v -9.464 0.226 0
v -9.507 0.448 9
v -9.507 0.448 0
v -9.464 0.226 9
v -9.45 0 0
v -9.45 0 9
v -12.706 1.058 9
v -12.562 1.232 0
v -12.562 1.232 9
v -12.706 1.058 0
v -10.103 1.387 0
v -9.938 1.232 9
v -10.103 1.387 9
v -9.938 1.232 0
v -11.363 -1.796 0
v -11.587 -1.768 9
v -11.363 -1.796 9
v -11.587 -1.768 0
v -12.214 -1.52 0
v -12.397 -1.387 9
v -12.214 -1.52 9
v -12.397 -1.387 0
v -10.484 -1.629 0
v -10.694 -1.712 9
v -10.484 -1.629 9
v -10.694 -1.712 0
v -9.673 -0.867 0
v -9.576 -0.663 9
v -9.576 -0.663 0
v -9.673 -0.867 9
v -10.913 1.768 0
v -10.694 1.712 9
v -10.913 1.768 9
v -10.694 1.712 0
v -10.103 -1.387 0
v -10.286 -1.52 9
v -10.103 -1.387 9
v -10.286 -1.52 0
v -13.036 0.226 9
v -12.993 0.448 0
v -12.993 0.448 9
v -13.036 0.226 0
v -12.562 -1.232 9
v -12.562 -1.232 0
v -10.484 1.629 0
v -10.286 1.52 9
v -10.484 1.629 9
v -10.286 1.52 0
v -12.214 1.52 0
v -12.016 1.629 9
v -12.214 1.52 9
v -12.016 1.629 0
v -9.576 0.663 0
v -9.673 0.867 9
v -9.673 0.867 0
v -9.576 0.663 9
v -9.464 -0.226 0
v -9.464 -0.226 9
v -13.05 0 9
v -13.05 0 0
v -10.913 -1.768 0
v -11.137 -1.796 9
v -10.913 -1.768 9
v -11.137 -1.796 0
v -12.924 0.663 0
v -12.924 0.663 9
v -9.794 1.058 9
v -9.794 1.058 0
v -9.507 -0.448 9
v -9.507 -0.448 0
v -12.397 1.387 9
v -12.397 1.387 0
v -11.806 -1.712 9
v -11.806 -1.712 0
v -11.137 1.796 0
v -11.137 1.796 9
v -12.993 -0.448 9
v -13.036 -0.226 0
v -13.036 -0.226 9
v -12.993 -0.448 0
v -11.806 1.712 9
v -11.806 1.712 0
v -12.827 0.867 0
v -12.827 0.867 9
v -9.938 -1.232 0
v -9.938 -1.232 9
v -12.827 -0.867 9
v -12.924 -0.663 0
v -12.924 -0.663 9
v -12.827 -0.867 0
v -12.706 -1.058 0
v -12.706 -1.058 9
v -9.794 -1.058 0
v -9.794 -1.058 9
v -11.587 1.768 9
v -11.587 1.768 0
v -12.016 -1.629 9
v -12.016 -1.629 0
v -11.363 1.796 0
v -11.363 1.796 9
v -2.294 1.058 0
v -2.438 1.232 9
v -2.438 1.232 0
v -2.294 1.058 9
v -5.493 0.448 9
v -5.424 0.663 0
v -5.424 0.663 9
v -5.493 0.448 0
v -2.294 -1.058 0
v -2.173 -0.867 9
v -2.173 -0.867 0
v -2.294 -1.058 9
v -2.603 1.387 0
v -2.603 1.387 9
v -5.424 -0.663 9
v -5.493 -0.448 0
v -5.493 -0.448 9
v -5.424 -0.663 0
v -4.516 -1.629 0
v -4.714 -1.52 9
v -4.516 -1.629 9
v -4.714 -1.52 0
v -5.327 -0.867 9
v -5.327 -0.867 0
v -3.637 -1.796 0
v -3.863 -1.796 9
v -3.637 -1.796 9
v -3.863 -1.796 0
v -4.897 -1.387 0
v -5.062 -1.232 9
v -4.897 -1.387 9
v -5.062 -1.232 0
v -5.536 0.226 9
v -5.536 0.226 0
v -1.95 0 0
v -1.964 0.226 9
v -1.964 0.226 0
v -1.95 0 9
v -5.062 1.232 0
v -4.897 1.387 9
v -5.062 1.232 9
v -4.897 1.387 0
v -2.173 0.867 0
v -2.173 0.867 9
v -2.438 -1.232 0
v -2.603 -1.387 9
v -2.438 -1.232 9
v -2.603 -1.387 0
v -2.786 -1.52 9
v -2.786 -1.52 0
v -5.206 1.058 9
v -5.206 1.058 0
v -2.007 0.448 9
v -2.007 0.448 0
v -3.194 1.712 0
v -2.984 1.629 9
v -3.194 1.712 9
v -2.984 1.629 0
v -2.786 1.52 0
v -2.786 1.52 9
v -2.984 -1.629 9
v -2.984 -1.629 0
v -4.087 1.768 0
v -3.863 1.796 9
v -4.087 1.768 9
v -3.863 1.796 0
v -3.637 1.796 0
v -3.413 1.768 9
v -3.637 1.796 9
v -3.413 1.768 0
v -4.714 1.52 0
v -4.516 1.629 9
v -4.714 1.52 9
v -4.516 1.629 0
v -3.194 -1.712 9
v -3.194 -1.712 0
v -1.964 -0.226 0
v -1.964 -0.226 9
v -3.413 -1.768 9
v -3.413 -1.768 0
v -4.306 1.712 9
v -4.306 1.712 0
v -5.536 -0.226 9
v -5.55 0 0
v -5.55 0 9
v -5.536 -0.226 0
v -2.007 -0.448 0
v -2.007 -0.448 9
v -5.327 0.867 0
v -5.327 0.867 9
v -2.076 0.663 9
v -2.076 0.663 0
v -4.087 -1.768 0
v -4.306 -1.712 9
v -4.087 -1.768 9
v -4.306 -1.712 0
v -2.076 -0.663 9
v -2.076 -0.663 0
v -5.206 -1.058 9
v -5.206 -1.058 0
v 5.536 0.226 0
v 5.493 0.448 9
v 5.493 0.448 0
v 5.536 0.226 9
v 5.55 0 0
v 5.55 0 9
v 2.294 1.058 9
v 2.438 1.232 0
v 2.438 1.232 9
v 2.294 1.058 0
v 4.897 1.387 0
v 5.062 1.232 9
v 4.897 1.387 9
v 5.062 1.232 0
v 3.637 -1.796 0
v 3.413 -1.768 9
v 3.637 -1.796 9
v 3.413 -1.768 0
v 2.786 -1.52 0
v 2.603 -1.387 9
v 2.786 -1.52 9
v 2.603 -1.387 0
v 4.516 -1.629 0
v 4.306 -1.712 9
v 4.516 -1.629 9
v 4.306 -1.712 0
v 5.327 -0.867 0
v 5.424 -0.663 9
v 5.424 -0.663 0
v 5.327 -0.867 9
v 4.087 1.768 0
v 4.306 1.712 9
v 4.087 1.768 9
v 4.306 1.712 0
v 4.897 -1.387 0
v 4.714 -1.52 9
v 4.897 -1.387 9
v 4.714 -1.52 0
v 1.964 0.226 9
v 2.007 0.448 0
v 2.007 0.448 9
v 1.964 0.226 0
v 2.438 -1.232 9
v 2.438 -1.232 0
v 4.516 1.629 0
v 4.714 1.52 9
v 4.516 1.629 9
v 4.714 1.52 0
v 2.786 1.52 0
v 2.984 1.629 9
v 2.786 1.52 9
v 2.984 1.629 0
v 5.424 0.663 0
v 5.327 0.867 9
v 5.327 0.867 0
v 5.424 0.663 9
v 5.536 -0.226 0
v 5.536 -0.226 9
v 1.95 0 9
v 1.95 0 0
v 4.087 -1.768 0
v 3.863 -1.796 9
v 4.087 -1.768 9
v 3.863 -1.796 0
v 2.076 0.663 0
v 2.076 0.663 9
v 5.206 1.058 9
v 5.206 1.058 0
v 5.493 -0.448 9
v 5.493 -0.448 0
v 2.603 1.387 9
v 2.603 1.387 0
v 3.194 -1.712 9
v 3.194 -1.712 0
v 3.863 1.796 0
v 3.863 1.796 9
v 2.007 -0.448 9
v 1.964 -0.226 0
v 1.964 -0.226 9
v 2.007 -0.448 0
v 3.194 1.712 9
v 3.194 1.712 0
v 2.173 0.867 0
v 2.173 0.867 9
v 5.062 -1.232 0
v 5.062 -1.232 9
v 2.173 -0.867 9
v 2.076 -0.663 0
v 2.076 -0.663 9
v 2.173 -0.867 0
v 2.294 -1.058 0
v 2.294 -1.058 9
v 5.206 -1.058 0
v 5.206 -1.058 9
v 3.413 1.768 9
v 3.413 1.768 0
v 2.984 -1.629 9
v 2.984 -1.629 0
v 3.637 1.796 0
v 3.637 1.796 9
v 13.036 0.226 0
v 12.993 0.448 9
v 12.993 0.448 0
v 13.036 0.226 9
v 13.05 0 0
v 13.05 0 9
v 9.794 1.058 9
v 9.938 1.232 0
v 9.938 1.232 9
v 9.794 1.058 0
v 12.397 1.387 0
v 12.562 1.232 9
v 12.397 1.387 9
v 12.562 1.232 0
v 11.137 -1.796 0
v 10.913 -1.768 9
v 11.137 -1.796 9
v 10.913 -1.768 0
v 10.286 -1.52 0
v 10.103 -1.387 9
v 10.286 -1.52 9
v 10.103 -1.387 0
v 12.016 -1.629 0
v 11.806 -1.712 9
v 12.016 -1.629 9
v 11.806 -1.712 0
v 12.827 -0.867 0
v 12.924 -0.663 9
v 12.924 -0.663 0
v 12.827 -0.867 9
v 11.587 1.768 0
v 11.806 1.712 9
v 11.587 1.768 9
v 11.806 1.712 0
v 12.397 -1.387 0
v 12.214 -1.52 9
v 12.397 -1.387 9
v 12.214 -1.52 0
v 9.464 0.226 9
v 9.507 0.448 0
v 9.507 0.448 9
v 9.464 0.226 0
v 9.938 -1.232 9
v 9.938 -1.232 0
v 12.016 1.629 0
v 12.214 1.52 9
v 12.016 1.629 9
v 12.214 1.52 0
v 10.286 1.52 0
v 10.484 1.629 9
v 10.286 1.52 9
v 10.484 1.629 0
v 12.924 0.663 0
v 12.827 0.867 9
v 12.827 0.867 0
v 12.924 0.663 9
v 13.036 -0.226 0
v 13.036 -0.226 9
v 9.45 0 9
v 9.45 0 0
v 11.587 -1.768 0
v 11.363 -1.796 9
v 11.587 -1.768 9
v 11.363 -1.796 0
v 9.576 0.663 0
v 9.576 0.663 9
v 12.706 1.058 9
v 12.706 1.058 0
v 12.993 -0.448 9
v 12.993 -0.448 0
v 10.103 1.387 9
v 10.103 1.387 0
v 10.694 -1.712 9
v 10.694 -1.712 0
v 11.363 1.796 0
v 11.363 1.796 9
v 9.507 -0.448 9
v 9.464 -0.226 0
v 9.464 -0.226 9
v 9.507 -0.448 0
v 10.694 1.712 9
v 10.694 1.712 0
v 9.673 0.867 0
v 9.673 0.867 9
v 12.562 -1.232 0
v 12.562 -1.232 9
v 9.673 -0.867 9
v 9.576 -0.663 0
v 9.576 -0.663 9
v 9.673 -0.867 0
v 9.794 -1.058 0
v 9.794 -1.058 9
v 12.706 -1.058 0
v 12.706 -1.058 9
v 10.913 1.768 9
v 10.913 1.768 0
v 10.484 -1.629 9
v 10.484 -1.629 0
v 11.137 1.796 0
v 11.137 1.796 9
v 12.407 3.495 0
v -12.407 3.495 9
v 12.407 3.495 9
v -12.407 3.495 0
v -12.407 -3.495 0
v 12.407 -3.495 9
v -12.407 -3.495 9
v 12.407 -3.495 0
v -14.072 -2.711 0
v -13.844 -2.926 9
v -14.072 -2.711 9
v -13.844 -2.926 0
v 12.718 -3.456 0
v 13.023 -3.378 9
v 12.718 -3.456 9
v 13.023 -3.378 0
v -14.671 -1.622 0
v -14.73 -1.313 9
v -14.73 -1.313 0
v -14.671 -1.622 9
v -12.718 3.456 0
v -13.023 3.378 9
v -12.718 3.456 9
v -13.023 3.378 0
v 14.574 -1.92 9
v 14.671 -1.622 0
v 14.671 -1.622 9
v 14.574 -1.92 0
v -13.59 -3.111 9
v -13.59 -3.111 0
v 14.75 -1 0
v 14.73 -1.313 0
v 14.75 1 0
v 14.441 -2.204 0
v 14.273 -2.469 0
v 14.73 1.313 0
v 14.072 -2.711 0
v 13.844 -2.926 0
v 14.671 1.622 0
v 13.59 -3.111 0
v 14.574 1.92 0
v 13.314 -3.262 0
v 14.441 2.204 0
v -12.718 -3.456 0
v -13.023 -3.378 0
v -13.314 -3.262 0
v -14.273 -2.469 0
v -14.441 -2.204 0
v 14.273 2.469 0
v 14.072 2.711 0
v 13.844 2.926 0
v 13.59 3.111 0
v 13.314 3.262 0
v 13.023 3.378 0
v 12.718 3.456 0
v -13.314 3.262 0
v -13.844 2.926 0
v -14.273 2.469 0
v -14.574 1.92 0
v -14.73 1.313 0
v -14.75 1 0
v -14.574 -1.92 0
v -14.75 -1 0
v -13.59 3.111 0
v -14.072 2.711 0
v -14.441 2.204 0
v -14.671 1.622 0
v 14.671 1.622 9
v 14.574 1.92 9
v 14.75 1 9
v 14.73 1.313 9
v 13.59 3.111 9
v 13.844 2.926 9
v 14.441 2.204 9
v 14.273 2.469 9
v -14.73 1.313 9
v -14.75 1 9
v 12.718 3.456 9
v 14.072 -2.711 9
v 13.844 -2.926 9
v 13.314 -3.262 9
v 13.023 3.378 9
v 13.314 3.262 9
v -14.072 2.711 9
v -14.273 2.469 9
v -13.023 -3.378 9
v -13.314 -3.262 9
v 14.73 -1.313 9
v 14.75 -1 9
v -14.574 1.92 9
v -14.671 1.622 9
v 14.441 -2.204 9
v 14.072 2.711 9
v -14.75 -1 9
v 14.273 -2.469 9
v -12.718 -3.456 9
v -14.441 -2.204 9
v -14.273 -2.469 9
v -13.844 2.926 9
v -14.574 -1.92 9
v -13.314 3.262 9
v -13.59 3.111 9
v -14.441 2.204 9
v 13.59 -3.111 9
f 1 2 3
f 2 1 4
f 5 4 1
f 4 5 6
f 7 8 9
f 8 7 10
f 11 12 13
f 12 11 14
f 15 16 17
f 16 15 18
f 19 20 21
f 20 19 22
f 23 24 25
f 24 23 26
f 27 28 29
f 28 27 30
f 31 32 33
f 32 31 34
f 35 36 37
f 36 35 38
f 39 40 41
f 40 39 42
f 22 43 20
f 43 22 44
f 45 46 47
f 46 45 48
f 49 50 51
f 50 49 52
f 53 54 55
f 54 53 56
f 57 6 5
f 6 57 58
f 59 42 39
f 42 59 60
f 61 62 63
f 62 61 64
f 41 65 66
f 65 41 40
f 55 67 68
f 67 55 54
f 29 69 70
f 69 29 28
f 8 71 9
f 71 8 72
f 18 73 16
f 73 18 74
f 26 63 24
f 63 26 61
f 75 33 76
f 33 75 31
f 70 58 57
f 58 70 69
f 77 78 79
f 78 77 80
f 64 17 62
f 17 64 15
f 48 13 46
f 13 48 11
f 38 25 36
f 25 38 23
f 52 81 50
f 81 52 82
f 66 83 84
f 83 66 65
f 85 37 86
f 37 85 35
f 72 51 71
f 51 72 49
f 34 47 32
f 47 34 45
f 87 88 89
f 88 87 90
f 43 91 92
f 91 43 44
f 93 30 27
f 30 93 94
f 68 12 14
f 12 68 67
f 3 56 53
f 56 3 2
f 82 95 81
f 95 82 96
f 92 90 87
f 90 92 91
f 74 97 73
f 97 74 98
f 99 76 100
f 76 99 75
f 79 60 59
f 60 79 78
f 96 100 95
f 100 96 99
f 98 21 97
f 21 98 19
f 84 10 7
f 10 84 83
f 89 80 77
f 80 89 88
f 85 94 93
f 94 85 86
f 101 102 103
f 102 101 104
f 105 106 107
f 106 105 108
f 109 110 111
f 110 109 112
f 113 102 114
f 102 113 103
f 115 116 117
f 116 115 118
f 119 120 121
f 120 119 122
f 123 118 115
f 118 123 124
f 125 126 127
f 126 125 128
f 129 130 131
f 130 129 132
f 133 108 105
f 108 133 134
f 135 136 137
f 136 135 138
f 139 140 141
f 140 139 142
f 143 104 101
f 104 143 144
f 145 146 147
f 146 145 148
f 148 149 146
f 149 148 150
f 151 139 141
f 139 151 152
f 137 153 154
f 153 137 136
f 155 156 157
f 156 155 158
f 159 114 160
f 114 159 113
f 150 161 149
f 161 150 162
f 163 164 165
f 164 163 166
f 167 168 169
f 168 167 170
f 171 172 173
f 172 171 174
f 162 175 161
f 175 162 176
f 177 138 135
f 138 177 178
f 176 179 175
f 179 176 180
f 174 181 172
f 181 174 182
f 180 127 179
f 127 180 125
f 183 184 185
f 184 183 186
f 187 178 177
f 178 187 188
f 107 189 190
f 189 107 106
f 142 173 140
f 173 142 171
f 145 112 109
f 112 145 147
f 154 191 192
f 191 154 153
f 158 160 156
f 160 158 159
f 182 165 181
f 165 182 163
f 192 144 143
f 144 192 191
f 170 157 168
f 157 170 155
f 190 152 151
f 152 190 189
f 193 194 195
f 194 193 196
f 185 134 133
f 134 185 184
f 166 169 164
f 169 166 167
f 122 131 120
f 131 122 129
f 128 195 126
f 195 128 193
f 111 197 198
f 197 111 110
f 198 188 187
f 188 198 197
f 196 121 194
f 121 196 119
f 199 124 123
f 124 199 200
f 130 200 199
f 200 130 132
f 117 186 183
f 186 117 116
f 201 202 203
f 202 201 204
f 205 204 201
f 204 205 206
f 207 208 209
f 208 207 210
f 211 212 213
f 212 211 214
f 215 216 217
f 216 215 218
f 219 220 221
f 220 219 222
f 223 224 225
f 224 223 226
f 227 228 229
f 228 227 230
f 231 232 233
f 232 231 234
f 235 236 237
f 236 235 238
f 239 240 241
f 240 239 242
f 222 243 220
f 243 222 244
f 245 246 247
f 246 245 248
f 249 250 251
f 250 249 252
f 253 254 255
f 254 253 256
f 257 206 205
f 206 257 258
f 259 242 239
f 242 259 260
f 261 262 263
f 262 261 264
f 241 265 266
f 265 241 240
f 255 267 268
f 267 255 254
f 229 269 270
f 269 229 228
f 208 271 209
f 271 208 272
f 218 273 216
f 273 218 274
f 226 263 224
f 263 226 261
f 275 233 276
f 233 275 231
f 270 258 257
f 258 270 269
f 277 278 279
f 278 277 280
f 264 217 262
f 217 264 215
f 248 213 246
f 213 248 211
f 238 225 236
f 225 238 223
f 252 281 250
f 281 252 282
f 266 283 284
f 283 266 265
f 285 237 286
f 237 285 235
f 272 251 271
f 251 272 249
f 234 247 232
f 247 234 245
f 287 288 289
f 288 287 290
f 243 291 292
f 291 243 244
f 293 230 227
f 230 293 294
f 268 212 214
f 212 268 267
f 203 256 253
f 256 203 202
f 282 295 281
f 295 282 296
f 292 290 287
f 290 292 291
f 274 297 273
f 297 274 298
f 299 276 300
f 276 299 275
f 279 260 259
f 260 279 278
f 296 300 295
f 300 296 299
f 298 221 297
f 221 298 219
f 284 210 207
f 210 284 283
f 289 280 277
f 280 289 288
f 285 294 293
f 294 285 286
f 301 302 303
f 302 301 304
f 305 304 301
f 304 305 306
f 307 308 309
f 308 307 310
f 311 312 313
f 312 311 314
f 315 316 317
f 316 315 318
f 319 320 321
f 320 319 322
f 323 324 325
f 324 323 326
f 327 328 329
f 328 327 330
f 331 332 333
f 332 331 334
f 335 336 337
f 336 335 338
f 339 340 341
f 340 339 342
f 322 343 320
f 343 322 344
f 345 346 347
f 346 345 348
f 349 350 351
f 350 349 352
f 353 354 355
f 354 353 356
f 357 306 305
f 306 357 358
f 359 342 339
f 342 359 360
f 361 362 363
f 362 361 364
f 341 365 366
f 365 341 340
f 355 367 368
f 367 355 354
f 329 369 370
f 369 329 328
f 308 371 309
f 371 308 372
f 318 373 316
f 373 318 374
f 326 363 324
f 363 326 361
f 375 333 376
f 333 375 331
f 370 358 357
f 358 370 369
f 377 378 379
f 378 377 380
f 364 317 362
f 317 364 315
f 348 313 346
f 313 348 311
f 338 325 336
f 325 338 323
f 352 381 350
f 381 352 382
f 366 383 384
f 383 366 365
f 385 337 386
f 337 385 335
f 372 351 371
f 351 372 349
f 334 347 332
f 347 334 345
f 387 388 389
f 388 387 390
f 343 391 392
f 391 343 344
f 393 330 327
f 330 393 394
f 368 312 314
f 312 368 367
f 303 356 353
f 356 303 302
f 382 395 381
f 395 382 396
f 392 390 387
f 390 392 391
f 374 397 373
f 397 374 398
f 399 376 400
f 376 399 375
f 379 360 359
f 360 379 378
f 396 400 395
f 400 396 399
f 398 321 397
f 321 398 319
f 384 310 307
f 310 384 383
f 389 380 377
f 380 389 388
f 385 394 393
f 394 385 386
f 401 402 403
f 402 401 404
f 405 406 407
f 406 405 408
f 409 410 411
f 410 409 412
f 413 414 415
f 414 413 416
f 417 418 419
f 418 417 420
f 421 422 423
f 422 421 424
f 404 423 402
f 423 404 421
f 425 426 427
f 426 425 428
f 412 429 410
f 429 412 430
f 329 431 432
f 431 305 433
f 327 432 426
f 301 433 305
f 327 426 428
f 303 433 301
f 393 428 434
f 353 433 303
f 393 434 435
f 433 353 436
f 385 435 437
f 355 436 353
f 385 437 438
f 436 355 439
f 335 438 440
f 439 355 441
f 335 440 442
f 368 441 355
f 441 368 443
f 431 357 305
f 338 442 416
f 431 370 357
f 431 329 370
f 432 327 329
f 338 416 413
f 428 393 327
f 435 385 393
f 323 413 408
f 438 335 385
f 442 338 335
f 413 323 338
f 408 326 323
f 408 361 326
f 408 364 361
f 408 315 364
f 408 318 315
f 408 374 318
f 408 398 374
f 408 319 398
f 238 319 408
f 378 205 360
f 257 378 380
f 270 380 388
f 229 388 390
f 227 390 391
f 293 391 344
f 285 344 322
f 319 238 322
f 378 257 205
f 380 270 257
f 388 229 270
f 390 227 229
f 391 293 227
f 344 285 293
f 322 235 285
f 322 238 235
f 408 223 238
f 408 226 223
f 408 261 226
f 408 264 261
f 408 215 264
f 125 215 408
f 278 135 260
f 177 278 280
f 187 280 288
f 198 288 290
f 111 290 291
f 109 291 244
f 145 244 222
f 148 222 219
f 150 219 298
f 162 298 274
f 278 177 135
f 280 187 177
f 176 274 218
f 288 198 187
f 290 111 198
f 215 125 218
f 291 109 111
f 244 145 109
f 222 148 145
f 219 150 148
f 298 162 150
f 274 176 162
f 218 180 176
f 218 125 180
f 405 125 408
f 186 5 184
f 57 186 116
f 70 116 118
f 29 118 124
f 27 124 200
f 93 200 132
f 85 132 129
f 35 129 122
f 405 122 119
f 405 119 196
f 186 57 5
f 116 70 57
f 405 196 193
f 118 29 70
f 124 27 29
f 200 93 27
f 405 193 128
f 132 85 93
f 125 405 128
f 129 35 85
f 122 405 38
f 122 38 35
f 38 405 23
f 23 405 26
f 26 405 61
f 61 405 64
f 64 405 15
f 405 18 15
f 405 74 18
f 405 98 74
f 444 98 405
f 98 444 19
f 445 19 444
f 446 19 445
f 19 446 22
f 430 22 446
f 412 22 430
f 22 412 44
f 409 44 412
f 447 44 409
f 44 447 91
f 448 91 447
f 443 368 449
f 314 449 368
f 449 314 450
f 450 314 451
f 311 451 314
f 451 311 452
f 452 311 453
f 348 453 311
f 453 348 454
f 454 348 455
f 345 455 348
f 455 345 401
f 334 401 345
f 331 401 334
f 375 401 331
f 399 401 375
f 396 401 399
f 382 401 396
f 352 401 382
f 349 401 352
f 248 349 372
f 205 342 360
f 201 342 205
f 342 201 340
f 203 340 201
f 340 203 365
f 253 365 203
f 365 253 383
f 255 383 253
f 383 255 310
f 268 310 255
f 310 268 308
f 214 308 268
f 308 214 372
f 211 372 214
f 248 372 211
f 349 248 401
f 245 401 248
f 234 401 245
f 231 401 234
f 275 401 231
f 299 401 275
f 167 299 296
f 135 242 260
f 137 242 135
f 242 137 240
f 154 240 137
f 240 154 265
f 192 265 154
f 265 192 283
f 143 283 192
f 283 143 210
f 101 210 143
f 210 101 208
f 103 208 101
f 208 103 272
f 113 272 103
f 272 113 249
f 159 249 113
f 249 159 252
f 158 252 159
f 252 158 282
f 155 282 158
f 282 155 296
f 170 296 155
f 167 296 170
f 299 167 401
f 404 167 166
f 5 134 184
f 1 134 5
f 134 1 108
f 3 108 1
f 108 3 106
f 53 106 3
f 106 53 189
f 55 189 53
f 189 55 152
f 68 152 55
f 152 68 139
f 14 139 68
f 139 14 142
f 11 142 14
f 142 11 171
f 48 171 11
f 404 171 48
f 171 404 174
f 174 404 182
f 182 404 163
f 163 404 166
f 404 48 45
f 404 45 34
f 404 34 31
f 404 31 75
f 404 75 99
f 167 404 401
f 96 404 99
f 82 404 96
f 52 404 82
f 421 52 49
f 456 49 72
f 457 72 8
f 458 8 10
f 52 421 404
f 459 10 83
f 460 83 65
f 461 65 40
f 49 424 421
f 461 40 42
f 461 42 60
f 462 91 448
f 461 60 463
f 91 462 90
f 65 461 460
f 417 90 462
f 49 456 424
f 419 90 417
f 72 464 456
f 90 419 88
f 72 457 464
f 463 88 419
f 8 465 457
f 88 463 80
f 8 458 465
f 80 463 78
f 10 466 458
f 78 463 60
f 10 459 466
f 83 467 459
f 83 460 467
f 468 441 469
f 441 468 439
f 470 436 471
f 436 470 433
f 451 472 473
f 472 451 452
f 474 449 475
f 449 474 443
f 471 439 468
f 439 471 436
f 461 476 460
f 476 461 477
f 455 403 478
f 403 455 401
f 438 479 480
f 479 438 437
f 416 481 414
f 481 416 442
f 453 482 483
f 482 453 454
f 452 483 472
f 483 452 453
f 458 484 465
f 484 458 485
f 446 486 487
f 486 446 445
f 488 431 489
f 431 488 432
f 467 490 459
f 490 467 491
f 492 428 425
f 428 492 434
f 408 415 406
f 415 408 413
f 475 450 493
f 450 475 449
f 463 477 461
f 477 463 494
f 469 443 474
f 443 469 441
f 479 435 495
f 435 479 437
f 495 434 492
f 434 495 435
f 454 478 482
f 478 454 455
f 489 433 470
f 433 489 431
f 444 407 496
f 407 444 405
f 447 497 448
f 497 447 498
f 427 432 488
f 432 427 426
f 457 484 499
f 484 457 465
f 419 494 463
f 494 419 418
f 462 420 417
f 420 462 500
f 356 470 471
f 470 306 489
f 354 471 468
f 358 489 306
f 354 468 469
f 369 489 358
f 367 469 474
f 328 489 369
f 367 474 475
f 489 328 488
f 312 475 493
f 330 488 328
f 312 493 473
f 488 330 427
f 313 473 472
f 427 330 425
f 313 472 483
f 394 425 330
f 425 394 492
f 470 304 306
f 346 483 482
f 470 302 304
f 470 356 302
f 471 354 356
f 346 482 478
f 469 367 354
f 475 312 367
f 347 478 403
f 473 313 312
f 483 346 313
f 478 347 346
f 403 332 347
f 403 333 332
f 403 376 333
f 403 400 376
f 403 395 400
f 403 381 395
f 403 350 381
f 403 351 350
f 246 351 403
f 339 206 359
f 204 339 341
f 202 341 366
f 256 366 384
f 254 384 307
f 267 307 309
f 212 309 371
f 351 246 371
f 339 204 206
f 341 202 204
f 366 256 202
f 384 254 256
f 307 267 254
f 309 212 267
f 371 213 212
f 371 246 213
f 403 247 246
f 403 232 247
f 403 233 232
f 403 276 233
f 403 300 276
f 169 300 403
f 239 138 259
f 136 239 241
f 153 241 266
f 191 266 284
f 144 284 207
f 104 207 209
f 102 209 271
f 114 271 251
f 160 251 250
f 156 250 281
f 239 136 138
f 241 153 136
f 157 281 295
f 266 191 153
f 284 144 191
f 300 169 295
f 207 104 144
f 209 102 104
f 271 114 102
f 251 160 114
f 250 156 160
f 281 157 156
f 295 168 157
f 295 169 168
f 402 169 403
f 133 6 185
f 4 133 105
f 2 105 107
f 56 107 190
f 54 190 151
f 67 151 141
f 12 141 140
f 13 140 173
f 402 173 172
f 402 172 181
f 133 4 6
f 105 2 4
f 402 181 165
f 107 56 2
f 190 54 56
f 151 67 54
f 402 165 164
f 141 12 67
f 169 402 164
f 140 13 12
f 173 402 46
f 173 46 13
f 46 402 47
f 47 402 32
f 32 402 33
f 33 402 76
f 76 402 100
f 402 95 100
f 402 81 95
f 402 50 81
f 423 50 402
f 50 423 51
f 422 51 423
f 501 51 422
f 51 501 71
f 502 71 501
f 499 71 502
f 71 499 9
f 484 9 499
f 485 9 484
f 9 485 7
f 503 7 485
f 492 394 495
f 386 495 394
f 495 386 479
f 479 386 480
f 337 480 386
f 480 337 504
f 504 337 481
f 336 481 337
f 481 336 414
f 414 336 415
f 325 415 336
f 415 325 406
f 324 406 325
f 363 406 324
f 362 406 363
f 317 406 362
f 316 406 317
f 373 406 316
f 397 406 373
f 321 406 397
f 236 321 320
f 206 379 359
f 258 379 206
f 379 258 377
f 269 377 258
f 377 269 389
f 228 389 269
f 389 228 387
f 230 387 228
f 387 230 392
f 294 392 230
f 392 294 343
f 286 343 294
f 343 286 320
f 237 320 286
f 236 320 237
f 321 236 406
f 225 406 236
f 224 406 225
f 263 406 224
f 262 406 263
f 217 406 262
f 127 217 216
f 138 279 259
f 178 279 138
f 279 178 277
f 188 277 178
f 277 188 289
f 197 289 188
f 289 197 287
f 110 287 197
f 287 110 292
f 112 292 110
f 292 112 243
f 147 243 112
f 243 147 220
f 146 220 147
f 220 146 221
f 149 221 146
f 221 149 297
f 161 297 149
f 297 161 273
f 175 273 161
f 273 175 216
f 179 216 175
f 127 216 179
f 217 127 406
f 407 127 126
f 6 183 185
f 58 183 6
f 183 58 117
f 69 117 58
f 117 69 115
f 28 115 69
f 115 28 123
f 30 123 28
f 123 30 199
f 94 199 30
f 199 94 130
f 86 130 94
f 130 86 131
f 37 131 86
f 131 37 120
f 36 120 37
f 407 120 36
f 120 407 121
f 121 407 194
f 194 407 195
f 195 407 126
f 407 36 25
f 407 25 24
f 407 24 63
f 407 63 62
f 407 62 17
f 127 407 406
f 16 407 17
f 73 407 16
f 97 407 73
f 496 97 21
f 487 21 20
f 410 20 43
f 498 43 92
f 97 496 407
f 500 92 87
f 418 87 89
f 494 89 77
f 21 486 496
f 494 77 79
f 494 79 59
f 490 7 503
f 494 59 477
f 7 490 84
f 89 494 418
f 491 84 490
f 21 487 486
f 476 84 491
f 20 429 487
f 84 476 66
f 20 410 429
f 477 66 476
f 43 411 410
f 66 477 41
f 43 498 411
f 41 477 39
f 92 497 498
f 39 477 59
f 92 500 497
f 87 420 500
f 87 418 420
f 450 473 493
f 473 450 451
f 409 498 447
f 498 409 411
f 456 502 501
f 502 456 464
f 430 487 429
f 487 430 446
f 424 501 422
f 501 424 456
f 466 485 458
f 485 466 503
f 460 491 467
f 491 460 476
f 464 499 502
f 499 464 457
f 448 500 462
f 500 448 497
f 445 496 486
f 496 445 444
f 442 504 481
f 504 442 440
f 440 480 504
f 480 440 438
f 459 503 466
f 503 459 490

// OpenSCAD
$fn = 50;


difference() {
	union() {
		translate(v = [0, 0, 0]) {
			rotate(a = [0, 0, 0]) {
				hull() {
					translate(v = [-12.2500000000, 1.0000000000, 0]) {
						rotate(a = [0, 0, 0]) {
							translate(v = [0, 0, 0]) {
								rotate(a = [0, 0, 0]) {
									cylinder(h = 9, r = 2.5000000000);
								}
							}
						}
					}
					translate(v = [12.2500000000, 1.0000000000, 0]) {
						rotate(a = [0, 0, 0]) {
							translate(v = [0, 0, 0]) {
								rotate(a = [0, 0, 0]) {
									cylinder(h = 9, r = 2.5000000000);
								}
							}
						}
					}
					translate(v = [-12.2500000000, -1.0000000000, 0]) {
						rotate(a = [0, 0, 0]) {
							translate(v = [0, 0, 0]) {
								rotate(a = [0, 0, 0]) {
									cylinder(h = 9, r = 2.5000000000);
								}
							}
						}
					}
					translate(v = [12.2500000000, -1.0000000000, 0]) {
						rotate(a = [0, 0, 0]) {
							translate(v = [0, 0, 0]) {
								rotate(a = [0, 0, 0]) {
									cylinder(h = 9, r = 2.5000000000);
								}
							}
						}
					}
				}
			}
		}
	}
	union() {
		translate(v = [-11.2500000000, 0.0000000000, 0]) {
			rotate(a = [0, 0, 0]) {
				translate(v = [0, 0, -50]) {
					rotate(a = [0, 0, 0]) {
						cylinder(h = 100, r = 1.8000000000);
					}
				}
			}
		}
		translate(v = [-3.7500000000, 0.0000000000, 0]) {
			rotate(a = [0, 0, 0]) {
				translate(v = [0, 0, -50]) {
					rotate(a = [0, 0, 0]) {
						cylinder(h = 100, r = 1.8000000000);
					}
				}
			}
		}
		translate(v = [3.7500000000, 0.0000000000, 0]) {
			rotate(a = [0, 0, 0]) {
				translate(v = [0, 0, -50]) {
					rotate(a = [0, 0, 0]) {
						cylinder(h = 100, r = 1.8000000000);
					}
				}
			}
		}
		translate(v = [11.2500000000, 0.0000000000, 0]) {
			rotate(a = [0, 0, 0]) {
				translate(v = [0, 0, -50]) {
					rotate(a = [0, 0, 0]) {
						cylinder(h = 100, r = 1.8000000000);
					}
				}
			}
		}
	}
}
